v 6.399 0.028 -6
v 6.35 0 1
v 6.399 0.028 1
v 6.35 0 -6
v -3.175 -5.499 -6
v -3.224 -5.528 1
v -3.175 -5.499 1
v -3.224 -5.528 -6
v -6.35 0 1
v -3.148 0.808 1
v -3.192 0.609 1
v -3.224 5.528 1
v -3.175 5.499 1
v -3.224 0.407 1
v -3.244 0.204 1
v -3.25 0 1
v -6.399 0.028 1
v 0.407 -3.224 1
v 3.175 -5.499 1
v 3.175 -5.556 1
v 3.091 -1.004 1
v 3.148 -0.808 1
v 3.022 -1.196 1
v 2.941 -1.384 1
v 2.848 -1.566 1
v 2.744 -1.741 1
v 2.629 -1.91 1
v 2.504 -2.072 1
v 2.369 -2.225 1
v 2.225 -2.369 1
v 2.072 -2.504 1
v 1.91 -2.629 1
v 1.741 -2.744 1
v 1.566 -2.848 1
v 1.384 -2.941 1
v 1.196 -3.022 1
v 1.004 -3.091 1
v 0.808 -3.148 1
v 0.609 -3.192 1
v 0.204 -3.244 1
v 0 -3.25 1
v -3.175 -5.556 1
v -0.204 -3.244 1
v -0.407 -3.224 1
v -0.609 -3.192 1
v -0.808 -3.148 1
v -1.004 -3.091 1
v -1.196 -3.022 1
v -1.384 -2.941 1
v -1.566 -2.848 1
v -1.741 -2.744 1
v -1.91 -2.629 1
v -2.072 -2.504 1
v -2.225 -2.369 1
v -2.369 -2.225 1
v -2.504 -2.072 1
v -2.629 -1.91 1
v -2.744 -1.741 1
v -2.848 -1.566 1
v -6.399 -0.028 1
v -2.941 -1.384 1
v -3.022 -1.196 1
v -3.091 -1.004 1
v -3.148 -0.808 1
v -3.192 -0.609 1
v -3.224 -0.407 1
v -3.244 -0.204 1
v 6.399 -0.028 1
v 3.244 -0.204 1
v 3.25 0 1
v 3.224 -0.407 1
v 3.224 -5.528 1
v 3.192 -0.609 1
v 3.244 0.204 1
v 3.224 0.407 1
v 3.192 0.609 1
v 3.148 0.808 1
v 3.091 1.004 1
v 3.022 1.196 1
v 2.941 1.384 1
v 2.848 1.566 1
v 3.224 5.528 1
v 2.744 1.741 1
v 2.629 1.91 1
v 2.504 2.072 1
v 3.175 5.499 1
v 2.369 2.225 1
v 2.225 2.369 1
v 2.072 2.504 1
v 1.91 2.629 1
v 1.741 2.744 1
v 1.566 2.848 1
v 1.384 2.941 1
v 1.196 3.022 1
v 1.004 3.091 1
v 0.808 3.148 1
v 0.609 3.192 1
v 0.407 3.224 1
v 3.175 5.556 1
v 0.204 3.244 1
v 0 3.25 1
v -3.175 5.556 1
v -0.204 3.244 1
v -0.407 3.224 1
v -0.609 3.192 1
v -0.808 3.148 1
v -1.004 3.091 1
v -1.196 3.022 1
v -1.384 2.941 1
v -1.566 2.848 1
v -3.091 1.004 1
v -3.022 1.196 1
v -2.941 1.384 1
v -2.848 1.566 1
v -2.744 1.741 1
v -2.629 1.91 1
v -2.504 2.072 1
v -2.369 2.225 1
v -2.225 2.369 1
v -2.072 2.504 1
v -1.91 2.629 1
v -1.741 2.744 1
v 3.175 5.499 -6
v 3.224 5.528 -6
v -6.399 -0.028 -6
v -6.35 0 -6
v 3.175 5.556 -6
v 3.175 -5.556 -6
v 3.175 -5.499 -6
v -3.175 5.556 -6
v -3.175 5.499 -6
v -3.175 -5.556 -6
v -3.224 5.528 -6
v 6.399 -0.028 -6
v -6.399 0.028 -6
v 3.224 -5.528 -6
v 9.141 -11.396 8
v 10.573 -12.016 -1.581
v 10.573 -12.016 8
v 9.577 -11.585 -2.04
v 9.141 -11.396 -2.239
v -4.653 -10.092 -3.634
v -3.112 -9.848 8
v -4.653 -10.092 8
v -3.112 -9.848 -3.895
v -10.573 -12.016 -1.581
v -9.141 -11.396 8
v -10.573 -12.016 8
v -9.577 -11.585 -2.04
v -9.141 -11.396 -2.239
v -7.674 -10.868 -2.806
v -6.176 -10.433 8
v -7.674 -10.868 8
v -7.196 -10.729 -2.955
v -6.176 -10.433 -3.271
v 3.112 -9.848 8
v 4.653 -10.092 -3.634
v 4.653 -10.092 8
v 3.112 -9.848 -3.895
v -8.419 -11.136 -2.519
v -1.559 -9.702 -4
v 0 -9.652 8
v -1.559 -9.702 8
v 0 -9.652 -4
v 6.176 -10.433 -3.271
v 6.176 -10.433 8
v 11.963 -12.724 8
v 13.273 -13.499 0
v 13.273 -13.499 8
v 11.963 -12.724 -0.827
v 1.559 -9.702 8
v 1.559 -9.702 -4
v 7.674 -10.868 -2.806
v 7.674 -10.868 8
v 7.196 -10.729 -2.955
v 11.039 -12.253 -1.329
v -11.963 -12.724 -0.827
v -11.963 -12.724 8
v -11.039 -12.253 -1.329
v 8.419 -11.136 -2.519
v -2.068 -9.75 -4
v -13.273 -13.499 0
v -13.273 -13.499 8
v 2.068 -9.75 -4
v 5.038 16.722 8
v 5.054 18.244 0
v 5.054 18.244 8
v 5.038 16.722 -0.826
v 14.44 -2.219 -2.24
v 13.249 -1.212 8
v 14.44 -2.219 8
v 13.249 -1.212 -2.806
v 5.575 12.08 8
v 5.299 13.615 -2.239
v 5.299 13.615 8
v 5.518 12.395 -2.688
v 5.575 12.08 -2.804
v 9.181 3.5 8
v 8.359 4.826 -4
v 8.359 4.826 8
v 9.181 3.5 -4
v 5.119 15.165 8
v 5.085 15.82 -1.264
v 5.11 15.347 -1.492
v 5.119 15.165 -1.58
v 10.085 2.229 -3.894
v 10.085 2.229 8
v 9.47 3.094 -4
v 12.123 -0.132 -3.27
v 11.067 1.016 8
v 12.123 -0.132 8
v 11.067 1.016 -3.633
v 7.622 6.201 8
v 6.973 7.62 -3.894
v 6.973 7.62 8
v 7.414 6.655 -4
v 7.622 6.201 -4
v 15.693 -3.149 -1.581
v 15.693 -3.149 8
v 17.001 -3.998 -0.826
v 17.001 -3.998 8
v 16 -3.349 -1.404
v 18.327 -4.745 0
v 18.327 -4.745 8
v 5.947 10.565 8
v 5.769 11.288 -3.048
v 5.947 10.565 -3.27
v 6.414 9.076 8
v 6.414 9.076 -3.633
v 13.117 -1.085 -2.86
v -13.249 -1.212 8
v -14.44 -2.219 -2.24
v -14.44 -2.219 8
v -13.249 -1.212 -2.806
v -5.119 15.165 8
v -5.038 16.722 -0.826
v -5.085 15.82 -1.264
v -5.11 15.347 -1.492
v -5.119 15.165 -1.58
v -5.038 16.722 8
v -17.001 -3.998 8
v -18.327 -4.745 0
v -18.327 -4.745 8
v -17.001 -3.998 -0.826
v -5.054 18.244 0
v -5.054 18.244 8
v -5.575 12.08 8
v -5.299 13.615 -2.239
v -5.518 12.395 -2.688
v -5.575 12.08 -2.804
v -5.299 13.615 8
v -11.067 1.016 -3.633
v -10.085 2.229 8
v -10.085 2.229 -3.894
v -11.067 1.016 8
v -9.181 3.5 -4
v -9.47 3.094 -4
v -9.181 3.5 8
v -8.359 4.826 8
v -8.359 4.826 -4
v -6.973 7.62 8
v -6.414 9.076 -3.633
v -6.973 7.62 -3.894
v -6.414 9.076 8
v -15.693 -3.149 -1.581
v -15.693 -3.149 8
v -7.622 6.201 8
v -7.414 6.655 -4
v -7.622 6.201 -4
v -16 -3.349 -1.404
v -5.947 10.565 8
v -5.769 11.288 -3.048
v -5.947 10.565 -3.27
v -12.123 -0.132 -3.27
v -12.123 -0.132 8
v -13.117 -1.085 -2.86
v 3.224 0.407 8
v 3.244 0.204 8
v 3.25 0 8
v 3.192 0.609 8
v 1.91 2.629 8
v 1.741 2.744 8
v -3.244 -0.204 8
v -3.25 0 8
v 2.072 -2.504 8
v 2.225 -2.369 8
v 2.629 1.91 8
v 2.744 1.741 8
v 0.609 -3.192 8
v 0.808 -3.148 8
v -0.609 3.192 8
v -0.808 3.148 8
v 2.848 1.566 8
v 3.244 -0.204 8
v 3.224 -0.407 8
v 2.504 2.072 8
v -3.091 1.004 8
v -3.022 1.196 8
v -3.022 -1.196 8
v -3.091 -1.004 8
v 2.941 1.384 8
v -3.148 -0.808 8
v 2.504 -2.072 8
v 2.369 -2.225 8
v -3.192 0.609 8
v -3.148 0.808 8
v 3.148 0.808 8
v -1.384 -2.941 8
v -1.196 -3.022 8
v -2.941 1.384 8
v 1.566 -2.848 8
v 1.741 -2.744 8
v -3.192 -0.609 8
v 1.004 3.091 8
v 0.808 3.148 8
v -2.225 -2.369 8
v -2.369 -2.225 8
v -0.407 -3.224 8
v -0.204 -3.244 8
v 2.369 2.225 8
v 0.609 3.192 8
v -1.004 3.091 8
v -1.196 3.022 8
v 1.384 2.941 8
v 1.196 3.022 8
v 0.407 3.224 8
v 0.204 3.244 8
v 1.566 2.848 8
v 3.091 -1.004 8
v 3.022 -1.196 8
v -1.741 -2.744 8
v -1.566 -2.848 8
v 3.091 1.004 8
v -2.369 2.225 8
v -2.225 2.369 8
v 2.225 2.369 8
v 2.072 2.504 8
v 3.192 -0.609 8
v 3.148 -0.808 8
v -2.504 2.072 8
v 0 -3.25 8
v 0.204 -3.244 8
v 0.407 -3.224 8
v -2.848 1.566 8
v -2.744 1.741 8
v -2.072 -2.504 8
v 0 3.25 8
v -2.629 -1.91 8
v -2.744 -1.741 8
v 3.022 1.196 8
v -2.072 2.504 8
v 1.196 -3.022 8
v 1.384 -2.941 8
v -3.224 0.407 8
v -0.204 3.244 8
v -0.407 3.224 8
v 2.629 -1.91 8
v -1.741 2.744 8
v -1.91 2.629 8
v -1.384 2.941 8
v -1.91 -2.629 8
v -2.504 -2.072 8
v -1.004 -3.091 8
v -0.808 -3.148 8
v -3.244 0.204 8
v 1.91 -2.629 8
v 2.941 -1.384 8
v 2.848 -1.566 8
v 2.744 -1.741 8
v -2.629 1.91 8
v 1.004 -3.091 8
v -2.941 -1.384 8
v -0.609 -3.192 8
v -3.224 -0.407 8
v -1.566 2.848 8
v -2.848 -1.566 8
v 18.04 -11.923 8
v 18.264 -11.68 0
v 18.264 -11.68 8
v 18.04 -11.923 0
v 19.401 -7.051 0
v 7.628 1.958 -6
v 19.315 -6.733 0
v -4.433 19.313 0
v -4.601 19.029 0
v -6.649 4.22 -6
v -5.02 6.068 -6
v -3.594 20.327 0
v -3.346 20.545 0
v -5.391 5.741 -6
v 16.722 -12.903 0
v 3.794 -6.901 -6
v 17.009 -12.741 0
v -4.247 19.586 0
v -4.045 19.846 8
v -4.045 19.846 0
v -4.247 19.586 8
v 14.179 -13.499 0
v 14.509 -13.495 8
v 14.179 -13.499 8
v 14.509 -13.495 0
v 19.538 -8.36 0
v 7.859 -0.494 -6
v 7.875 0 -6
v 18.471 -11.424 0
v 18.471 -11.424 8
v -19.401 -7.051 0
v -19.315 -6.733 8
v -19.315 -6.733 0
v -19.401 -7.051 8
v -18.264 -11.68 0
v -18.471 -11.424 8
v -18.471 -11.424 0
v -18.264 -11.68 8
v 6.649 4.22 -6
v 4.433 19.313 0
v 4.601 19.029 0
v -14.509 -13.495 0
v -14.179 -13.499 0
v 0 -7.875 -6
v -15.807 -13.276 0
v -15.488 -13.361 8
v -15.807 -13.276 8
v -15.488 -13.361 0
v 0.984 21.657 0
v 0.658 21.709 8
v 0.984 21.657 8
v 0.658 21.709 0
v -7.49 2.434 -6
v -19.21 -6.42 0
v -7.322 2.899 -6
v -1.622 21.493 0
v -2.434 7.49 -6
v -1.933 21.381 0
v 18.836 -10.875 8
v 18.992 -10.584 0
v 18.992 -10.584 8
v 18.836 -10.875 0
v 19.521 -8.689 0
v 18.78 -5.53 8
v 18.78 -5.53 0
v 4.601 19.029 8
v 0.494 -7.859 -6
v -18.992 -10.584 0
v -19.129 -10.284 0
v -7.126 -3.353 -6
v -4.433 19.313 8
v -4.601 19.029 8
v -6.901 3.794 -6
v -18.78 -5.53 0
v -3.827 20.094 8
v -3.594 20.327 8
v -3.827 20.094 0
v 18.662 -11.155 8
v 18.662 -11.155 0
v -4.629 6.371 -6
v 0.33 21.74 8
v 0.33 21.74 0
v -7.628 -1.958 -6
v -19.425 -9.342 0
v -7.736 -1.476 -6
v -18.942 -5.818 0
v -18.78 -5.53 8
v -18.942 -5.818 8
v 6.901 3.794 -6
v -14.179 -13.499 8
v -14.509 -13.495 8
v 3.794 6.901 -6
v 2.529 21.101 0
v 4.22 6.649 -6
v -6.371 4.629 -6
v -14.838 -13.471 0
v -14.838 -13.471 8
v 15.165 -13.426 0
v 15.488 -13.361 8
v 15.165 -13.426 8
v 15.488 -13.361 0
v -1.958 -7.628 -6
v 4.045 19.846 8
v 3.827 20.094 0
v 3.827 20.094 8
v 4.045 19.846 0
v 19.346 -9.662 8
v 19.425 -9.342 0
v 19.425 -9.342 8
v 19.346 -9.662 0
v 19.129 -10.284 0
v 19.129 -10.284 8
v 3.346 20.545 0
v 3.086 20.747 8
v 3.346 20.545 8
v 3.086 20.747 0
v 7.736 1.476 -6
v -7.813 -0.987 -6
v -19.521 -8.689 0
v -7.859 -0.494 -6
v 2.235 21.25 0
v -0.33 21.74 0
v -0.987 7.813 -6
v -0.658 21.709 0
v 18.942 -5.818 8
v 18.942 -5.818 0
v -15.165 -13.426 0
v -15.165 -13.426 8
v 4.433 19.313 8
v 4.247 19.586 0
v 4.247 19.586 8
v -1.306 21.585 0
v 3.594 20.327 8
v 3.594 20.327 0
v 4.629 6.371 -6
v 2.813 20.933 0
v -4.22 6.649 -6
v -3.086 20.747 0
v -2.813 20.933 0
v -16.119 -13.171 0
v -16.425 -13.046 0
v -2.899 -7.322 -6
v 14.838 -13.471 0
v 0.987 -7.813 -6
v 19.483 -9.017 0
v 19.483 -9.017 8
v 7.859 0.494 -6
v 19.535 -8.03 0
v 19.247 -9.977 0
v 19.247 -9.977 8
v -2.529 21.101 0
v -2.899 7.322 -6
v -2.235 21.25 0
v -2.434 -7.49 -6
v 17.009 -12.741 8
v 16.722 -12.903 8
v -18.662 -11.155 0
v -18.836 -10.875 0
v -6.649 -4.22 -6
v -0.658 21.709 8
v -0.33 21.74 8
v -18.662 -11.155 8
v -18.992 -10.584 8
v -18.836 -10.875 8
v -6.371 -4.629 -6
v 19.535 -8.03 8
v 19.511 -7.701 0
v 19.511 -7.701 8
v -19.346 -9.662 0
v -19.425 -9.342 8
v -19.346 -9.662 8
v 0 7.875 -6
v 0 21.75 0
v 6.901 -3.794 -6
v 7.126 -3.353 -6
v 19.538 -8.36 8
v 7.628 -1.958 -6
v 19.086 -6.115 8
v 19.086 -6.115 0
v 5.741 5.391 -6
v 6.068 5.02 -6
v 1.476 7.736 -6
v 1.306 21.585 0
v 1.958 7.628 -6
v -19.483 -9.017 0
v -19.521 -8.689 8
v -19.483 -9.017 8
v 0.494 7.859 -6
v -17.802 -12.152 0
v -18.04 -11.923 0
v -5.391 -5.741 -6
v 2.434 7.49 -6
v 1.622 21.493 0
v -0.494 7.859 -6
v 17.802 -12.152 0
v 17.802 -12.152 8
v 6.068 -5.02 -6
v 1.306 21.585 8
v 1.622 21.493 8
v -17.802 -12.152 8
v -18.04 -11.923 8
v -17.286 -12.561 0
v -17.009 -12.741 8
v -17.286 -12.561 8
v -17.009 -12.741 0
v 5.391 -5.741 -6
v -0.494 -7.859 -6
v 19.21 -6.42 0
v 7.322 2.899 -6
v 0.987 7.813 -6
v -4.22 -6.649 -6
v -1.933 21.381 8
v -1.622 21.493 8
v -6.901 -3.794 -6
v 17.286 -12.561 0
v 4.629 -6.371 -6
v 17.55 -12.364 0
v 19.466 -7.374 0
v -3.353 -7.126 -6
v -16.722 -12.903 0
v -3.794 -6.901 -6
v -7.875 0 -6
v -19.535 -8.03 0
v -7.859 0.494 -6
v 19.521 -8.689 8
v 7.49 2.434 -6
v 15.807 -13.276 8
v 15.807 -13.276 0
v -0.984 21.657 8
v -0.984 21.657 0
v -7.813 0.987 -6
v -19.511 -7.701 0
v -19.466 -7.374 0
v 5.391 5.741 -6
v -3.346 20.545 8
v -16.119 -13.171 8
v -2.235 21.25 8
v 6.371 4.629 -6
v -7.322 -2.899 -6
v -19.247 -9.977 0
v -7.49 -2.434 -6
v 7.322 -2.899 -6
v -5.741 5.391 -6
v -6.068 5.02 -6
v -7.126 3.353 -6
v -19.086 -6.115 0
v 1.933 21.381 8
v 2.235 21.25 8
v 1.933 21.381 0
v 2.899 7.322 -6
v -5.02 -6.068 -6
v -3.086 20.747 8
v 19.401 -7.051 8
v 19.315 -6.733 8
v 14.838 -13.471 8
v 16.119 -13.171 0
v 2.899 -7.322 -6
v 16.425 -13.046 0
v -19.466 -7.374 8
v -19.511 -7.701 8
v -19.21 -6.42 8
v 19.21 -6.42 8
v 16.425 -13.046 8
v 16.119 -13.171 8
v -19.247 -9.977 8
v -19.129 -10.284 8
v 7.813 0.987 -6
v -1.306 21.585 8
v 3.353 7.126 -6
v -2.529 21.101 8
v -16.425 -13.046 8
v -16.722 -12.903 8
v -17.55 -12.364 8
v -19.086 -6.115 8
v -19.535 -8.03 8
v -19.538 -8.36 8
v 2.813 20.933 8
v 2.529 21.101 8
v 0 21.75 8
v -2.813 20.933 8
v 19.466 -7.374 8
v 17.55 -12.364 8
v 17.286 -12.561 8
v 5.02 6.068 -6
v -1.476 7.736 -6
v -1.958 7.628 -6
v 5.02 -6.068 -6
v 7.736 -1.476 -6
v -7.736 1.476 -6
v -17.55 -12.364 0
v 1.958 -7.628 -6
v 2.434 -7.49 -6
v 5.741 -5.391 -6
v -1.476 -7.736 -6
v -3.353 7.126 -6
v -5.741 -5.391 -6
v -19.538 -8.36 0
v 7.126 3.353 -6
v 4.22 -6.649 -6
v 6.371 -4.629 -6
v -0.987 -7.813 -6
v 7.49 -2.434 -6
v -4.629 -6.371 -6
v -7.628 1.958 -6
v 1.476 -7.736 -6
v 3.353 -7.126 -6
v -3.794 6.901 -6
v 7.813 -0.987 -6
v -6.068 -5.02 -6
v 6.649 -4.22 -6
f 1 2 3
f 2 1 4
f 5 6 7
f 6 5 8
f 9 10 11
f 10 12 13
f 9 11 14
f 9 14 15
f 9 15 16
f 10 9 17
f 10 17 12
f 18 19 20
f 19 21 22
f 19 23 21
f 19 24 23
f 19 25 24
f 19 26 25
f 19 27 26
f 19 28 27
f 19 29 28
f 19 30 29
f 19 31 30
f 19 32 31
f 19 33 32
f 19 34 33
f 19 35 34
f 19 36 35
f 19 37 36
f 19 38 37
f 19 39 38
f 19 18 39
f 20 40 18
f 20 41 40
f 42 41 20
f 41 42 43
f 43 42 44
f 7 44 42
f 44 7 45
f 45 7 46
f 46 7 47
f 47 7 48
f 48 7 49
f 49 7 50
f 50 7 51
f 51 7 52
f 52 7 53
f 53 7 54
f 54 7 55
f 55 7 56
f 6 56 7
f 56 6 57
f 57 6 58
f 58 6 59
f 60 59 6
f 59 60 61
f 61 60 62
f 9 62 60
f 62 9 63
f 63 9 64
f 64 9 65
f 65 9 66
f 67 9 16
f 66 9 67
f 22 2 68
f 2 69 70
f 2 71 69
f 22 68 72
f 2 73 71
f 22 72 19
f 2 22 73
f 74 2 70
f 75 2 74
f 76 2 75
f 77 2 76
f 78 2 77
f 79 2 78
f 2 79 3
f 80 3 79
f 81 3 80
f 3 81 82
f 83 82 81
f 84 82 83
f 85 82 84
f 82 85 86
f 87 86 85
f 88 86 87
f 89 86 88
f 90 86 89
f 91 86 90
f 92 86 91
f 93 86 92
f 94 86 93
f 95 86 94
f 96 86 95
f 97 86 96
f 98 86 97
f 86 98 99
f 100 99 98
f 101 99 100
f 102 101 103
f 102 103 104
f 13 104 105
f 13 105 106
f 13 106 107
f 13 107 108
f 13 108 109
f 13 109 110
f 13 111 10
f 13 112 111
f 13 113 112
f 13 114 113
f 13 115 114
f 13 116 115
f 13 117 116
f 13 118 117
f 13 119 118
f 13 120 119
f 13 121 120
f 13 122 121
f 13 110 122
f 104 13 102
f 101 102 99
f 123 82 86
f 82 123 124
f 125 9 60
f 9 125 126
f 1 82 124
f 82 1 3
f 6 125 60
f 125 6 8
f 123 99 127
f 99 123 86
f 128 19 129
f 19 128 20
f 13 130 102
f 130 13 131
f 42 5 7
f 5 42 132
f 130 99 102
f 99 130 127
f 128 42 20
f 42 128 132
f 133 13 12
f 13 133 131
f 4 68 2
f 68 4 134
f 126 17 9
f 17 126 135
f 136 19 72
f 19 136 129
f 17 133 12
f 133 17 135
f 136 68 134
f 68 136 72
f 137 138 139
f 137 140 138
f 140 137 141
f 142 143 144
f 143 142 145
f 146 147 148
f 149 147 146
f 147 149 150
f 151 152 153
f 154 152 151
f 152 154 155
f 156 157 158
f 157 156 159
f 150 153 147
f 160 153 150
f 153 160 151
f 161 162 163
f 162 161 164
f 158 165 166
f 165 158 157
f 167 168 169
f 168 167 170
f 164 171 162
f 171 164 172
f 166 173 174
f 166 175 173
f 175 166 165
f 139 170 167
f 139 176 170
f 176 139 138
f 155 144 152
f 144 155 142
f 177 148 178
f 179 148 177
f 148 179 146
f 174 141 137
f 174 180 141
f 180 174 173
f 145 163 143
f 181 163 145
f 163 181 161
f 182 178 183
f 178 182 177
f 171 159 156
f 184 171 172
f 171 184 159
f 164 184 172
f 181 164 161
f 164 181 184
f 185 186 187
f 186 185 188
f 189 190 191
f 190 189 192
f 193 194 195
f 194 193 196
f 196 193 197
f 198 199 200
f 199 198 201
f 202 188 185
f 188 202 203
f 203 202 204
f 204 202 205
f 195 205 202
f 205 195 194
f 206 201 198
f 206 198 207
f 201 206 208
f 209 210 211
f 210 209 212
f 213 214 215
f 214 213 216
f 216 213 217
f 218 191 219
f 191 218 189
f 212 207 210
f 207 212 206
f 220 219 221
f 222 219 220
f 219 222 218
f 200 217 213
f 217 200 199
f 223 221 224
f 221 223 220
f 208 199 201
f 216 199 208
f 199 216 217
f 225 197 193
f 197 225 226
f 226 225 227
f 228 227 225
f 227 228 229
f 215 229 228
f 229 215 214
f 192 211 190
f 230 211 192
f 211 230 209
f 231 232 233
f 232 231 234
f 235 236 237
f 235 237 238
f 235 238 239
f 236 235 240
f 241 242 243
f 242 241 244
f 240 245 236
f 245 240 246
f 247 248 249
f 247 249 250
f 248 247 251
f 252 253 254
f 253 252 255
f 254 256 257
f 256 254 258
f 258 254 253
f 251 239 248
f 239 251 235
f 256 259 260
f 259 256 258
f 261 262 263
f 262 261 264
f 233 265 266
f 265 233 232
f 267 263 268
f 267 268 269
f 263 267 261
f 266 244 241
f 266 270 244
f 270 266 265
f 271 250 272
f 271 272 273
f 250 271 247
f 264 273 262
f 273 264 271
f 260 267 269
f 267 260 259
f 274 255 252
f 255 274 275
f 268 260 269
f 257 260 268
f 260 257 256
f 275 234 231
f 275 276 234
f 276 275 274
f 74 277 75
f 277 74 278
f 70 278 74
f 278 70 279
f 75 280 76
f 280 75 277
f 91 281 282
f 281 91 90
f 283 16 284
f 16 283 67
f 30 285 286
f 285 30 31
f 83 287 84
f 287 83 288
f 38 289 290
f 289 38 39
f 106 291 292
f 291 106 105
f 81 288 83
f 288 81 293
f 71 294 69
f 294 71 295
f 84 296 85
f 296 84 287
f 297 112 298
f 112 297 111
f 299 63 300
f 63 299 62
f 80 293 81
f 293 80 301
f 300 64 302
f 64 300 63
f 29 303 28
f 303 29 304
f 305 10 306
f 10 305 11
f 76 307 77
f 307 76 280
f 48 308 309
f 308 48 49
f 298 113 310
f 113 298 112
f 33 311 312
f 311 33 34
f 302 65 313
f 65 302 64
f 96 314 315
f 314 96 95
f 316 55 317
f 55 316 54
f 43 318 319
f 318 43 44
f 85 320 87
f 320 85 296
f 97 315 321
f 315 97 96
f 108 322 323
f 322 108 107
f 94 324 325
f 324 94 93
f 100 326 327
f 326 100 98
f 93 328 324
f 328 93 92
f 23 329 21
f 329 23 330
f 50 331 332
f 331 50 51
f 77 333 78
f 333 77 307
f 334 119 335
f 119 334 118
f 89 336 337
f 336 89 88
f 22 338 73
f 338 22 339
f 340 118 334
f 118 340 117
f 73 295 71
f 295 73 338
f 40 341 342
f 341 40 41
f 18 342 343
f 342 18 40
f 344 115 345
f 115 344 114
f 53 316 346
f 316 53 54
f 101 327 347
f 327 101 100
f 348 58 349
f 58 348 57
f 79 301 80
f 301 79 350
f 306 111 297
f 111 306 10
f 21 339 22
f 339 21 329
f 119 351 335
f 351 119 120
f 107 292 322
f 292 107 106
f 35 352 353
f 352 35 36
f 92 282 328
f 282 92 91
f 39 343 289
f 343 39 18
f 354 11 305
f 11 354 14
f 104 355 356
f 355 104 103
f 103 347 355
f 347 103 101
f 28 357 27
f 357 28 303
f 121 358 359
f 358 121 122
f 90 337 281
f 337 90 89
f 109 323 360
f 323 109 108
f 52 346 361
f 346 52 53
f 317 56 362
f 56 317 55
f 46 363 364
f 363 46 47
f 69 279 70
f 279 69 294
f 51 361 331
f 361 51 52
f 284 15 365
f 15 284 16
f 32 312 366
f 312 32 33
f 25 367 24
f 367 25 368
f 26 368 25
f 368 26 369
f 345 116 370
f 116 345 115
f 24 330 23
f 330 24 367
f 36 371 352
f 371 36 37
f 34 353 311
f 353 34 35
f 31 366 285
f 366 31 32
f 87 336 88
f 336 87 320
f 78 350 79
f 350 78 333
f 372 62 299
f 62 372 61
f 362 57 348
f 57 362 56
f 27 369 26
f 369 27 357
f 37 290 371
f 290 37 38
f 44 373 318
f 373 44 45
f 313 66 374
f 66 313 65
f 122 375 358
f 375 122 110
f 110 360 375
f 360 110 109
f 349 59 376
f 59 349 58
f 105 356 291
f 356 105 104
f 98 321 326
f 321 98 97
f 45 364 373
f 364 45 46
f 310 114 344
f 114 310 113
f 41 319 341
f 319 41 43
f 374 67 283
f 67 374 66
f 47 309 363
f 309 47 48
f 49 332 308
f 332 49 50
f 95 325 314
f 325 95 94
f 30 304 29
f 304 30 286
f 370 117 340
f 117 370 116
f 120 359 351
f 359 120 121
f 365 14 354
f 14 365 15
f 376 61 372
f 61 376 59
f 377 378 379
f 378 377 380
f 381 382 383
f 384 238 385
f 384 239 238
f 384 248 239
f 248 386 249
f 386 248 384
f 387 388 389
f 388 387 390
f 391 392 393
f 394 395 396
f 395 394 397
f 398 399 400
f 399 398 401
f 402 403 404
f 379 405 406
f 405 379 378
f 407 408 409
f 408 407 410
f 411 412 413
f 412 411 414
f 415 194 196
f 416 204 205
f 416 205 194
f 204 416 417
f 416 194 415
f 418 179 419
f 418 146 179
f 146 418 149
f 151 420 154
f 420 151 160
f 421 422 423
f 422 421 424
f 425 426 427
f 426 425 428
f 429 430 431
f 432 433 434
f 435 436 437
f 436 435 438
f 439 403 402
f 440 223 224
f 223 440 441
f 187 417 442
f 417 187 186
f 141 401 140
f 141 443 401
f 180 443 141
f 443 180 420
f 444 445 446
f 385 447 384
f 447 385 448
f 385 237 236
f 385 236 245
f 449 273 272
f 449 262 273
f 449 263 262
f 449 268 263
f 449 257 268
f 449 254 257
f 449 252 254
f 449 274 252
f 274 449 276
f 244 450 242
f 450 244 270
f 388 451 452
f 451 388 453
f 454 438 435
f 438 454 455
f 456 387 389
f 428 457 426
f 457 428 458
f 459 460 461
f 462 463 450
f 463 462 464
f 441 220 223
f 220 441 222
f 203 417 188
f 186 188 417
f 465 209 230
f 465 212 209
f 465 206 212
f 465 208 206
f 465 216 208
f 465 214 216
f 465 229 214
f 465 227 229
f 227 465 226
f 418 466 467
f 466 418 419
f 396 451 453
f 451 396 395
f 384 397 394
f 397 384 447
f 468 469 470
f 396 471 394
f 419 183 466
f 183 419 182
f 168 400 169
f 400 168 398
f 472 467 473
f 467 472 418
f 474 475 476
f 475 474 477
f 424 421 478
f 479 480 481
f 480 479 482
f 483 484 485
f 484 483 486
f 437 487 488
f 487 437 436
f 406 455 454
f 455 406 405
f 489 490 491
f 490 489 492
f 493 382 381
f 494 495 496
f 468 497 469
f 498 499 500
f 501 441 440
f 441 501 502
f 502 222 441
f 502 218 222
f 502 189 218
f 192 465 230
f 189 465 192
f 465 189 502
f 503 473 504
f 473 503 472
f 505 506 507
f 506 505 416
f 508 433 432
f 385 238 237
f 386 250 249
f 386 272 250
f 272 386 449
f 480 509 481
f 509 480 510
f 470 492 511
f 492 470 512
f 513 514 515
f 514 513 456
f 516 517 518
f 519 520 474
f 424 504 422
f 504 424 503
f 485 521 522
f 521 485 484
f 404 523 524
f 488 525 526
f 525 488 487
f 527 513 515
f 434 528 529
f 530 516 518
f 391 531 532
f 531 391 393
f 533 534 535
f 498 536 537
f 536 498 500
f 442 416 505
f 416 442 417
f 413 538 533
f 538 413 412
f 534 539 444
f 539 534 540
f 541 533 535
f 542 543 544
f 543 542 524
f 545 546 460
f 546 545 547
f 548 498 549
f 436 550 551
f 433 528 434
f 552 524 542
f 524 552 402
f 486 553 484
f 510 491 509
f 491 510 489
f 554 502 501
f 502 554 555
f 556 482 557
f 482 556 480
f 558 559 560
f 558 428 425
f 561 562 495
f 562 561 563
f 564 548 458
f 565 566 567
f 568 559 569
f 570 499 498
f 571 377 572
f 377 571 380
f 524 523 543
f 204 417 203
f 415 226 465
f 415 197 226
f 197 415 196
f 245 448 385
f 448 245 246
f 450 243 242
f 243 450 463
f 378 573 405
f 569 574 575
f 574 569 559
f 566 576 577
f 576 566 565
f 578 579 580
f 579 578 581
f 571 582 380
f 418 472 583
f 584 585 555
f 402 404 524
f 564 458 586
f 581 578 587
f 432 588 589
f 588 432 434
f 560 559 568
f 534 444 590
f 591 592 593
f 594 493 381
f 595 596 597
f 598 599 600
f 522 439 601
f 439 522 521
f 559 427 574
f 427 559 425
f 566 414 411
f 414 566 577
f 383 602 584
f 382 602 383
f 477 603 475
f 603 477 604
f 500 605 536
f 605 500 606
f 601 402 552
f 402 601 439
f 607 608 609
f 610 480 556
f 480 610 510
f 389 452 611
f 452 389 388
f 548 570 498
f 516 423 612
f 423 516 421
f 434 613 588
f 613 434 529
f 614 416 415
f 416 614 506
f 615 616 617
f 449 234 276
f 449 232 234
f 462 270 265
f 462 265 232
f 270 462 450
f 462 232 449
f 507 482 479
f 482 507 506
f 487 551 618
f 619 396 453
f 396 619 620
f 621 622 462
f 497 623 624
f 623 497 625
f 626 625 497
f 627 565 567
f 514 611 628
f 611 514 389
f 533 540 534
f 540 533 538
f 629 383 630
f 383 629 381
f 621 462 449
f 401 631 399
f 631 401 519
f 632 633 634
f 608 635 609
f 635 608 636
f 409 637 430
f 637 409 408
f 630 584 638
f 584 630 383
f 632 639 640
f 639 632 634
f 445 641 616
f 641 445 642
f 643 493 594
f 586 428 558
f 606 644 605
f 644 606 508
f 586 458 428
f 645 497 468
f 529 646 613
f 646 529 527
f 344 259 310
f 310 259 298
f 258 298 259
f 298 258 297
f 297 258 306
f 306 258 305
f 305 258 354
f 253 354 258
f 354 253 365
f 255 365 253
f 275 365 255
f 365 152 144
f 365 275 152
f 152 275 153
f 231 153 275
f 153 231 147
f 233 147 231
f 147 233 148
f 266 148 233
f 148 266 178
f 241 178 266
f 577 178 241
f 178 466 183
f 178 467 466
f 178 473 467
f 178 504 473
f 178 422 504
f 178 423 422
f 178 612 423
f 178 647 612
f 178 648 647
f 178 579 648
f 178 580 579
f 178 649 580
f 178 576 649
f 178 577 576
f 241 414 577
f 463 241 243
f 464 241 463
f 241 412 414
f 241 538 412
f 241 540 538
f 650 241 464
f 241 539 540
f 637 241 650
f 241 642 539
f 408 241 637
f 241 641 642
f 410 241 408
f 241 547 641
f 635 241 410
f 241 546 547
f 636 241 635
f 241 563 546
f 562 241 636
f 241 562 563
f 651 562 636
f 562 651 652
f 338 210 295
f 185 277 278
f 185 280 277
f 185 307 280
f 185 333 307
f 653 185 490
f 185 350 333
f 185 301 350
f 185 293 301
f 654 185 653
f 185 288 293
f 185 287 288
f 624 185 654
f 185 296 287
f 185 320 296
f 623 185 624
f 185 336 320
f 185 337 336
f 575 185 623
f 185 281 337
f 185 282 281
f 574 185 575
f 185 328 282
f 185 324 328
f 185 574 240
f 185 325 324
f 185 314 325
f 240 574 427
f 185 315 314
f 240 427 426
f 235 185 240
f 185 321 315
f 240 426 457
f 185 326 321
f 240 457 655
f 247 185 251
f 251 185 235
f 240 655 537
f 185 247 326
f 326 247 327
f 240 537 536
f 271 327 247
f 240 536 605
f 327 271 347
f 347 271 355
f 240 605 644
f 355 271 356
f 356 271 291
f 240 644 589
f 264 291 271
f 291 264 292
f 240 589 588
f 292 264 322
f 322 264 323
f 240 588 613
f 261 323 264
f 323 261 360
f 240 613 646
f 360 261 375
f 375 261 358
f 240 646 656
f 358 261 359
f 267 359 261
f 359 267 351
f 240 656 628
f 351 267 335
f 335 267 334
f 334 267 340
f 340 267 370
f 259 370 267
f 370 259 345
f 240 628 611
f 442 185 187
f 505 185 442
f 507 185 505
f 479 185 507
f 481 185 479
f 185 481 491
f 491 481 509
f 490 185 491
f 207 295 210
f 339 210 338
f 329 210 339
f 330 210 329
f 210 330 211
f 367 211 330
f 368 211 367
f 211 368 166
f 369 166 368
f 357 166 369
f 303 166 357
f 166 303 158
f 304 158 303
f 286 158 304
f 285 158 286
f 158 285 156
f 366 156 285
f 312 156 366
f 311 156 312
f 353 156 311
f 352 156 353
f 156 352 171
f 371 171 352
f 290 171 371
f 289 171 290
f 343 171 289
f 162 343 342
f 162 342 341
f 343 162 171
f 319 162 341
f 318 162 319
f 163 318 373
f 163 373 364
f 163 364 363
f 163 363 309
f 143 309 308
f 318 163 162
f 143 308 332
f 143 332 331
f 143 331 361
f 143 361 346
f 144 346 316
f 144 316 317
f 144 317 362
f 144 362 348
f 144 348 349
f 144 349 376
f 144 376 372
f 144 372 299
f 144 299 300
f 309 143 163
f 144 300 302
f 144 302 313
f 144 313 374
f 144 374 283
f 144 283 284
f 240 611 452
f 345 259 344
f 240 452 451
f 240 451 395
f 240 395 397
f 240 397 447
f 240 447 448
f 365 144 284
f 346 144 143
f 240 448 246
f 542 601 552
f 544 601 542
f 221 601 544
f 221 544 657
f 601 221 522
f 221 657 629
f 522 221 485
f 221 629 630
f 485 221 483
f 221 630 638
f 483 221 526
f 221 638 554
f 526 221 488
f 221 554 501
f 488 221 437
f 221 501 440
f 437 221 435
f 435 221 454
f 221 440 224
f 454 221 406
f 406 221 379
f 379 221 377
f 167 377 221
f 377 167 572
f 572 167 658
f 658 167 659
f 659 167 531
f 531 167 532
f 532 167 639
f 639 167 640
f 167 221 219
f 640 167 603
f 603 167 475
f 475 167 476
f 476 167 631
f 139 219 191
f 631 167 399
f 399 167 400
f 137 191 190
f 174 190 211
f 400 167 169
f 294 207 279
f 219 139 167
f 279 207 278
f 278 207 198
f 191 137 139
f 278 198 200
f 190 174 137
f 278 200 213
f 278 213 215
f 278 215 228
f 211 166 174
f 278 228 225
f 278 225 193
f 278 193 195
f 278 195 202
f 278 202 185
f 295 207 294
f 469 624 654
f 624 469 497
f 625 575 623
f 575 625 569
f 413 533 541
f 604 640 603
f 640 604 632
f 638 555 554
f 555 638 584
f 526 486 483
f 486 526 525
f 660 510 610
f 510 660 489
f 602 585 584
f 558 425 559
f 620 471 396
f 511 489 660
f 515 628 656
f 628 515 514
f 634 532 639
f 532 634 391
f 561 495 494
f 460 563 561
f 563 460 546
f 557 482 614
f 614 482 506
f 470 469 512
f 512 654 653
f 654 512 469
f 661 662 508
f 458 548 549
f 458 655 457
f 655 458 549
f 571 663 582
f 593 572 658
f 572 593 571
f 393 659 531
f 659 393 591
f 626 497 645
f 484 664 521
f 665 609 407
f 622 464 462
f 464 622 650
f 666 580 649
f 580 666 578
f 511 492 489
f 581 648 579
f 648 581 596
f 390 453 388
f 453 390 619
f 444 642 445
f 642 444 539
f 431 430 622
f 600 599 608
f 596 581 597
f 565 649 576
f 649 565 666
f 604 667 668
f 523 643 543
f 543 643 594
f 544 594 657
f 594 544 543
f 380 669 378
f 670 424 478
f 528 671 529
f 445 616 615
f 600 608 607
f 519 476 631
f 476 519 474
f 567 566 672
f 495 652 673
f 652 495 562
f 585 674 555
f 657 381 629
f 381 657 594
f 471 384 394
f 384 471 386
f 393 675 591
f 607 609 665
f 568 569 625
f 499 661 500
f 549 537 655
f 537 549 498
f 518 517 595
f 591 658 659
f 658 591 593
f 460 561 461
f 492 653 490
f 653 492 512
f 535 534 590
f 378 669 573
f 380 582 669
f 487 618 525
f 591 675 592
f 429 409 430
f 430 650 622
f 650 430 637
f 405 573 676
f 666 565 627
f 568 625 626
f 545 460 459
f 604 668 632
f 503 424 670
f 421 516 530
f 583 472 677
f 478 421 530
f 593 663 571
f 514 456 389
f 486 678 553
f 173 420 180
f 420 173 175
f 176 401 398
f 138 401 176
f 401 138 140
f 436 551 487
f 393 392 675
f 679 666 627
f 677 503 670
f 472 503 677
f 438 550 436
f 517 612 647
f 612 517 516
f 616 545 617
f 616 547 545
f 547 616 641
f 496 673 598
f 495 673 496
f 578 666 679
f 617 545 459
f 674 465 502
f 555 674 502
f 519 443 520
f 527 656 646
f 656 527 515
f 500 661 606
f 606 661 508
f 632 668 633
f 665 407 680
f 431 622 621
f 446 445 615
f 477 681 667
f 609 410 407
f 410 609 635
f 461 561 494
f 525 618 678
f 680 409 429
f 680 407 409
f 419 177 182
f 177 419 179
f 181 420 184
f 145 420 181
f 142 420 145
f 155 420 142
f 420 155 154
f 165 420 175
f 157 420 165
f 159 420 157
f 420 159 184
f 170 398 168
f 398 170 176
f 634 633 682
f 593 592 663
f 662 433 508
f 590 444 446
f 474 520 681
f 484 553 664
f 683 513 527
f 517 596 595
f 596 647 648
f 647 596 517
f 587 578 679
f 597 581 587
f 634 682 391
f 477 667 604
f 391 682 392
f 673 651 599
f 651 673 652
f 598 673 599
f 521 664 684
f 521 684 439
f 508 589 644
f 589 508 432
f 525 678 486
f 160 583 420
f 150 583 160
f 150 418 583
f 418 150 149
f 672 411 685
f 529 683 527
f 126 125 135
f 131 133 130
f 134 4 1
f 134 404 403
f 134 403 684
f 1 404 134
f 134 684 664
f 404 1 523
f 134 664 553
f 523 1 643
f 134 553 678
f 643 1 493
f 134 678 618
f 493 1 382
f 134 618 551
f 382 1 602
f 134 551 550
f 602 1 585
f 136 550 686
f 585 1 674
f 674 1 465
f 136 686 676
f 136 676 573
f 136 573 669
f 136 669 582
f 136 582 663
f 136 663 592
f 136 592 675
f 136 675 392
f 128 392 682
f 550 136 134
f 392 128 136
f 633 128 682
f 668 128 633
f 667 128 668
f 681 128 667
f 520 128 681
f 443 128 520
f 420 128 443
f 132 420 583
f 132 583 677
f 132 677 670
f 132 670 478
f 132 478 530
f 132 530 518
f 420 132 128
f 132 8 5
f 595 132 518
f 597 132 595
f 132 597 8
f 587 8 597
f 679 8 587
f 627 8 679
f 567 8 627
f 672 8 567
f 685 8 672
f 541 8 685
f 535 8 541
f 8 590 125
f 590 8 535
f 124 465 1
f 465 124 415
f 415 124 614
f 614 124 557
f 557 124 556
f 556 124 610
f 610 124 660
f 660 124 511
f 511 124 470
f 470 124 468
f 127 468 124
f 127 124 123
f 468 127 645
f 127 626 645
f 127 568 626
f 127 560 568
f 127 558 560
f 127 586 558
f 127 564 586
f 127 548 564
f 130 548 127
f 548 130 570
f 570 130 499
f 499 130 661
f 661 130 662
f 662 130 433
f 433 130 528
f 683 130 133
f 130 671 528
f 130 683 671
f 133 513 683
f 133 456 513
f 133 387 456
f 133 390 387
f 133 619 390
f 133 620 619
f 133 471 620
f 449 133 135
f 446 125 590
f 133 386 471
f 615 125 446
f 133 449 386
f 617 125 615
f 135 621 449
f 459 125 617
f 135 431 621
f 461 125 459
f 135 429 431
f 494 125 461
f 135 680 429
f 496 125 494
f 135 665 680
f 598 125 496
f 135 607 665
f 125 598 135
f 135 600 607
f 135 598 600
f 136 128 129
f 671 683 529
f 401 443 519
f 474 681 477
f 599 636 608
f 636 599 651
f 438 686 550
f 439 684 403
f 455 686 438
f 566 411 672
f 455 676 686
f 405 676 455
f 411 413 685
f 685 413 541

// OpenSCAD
$fn = 100;

height = 8;
diameter = 10.5;
wingsize = 16.5;

// 1/4 inch hardware, press fit
hexHeight = 5;
hexWidth = 11.1125;
throughHoleDiameter = 3.25;


radius = diameter / 2;
thR = throughHoleDiameter / 2;

module hexagon(size, height){
  boxWidth = size/1.75;
  for (r = [-60, 0, 60]){
		rotate([0,0,r]) 
			cube([boxWidth, size, height*2], true);
		}
	}

difference(){
  hull(){
		//Wings
    for(i=[0:2]){
      rotate([0,0,120*i])
      hull(){
        cylinder(r=radius*2, h=height);
        translate([0,wingsize,0])
          cylinder(r=radius, h=height);
        }
      }
		//Core
    translate([0,0,-height/2-2])
      cylinder(r=radius*1.5, h=height);
    }
  union(){
    //Bore
		translate([0,0,-height/2])
      cylinder(r=throughHoleDiameter, h=height*3);
    
		//Nut
		translate([0,0,-4])
      hexagon(hexWidth, hexHeight);
    
		//Cutouts
		union(){
      for(i=[0:2]){
				rotate([0,0,120*i])
				translate([0,-wingsize*2.09,-height/2])
					cylinder(r=wingsize*1.505, h=height*2);
        }
      }
    }
  }
  
  
